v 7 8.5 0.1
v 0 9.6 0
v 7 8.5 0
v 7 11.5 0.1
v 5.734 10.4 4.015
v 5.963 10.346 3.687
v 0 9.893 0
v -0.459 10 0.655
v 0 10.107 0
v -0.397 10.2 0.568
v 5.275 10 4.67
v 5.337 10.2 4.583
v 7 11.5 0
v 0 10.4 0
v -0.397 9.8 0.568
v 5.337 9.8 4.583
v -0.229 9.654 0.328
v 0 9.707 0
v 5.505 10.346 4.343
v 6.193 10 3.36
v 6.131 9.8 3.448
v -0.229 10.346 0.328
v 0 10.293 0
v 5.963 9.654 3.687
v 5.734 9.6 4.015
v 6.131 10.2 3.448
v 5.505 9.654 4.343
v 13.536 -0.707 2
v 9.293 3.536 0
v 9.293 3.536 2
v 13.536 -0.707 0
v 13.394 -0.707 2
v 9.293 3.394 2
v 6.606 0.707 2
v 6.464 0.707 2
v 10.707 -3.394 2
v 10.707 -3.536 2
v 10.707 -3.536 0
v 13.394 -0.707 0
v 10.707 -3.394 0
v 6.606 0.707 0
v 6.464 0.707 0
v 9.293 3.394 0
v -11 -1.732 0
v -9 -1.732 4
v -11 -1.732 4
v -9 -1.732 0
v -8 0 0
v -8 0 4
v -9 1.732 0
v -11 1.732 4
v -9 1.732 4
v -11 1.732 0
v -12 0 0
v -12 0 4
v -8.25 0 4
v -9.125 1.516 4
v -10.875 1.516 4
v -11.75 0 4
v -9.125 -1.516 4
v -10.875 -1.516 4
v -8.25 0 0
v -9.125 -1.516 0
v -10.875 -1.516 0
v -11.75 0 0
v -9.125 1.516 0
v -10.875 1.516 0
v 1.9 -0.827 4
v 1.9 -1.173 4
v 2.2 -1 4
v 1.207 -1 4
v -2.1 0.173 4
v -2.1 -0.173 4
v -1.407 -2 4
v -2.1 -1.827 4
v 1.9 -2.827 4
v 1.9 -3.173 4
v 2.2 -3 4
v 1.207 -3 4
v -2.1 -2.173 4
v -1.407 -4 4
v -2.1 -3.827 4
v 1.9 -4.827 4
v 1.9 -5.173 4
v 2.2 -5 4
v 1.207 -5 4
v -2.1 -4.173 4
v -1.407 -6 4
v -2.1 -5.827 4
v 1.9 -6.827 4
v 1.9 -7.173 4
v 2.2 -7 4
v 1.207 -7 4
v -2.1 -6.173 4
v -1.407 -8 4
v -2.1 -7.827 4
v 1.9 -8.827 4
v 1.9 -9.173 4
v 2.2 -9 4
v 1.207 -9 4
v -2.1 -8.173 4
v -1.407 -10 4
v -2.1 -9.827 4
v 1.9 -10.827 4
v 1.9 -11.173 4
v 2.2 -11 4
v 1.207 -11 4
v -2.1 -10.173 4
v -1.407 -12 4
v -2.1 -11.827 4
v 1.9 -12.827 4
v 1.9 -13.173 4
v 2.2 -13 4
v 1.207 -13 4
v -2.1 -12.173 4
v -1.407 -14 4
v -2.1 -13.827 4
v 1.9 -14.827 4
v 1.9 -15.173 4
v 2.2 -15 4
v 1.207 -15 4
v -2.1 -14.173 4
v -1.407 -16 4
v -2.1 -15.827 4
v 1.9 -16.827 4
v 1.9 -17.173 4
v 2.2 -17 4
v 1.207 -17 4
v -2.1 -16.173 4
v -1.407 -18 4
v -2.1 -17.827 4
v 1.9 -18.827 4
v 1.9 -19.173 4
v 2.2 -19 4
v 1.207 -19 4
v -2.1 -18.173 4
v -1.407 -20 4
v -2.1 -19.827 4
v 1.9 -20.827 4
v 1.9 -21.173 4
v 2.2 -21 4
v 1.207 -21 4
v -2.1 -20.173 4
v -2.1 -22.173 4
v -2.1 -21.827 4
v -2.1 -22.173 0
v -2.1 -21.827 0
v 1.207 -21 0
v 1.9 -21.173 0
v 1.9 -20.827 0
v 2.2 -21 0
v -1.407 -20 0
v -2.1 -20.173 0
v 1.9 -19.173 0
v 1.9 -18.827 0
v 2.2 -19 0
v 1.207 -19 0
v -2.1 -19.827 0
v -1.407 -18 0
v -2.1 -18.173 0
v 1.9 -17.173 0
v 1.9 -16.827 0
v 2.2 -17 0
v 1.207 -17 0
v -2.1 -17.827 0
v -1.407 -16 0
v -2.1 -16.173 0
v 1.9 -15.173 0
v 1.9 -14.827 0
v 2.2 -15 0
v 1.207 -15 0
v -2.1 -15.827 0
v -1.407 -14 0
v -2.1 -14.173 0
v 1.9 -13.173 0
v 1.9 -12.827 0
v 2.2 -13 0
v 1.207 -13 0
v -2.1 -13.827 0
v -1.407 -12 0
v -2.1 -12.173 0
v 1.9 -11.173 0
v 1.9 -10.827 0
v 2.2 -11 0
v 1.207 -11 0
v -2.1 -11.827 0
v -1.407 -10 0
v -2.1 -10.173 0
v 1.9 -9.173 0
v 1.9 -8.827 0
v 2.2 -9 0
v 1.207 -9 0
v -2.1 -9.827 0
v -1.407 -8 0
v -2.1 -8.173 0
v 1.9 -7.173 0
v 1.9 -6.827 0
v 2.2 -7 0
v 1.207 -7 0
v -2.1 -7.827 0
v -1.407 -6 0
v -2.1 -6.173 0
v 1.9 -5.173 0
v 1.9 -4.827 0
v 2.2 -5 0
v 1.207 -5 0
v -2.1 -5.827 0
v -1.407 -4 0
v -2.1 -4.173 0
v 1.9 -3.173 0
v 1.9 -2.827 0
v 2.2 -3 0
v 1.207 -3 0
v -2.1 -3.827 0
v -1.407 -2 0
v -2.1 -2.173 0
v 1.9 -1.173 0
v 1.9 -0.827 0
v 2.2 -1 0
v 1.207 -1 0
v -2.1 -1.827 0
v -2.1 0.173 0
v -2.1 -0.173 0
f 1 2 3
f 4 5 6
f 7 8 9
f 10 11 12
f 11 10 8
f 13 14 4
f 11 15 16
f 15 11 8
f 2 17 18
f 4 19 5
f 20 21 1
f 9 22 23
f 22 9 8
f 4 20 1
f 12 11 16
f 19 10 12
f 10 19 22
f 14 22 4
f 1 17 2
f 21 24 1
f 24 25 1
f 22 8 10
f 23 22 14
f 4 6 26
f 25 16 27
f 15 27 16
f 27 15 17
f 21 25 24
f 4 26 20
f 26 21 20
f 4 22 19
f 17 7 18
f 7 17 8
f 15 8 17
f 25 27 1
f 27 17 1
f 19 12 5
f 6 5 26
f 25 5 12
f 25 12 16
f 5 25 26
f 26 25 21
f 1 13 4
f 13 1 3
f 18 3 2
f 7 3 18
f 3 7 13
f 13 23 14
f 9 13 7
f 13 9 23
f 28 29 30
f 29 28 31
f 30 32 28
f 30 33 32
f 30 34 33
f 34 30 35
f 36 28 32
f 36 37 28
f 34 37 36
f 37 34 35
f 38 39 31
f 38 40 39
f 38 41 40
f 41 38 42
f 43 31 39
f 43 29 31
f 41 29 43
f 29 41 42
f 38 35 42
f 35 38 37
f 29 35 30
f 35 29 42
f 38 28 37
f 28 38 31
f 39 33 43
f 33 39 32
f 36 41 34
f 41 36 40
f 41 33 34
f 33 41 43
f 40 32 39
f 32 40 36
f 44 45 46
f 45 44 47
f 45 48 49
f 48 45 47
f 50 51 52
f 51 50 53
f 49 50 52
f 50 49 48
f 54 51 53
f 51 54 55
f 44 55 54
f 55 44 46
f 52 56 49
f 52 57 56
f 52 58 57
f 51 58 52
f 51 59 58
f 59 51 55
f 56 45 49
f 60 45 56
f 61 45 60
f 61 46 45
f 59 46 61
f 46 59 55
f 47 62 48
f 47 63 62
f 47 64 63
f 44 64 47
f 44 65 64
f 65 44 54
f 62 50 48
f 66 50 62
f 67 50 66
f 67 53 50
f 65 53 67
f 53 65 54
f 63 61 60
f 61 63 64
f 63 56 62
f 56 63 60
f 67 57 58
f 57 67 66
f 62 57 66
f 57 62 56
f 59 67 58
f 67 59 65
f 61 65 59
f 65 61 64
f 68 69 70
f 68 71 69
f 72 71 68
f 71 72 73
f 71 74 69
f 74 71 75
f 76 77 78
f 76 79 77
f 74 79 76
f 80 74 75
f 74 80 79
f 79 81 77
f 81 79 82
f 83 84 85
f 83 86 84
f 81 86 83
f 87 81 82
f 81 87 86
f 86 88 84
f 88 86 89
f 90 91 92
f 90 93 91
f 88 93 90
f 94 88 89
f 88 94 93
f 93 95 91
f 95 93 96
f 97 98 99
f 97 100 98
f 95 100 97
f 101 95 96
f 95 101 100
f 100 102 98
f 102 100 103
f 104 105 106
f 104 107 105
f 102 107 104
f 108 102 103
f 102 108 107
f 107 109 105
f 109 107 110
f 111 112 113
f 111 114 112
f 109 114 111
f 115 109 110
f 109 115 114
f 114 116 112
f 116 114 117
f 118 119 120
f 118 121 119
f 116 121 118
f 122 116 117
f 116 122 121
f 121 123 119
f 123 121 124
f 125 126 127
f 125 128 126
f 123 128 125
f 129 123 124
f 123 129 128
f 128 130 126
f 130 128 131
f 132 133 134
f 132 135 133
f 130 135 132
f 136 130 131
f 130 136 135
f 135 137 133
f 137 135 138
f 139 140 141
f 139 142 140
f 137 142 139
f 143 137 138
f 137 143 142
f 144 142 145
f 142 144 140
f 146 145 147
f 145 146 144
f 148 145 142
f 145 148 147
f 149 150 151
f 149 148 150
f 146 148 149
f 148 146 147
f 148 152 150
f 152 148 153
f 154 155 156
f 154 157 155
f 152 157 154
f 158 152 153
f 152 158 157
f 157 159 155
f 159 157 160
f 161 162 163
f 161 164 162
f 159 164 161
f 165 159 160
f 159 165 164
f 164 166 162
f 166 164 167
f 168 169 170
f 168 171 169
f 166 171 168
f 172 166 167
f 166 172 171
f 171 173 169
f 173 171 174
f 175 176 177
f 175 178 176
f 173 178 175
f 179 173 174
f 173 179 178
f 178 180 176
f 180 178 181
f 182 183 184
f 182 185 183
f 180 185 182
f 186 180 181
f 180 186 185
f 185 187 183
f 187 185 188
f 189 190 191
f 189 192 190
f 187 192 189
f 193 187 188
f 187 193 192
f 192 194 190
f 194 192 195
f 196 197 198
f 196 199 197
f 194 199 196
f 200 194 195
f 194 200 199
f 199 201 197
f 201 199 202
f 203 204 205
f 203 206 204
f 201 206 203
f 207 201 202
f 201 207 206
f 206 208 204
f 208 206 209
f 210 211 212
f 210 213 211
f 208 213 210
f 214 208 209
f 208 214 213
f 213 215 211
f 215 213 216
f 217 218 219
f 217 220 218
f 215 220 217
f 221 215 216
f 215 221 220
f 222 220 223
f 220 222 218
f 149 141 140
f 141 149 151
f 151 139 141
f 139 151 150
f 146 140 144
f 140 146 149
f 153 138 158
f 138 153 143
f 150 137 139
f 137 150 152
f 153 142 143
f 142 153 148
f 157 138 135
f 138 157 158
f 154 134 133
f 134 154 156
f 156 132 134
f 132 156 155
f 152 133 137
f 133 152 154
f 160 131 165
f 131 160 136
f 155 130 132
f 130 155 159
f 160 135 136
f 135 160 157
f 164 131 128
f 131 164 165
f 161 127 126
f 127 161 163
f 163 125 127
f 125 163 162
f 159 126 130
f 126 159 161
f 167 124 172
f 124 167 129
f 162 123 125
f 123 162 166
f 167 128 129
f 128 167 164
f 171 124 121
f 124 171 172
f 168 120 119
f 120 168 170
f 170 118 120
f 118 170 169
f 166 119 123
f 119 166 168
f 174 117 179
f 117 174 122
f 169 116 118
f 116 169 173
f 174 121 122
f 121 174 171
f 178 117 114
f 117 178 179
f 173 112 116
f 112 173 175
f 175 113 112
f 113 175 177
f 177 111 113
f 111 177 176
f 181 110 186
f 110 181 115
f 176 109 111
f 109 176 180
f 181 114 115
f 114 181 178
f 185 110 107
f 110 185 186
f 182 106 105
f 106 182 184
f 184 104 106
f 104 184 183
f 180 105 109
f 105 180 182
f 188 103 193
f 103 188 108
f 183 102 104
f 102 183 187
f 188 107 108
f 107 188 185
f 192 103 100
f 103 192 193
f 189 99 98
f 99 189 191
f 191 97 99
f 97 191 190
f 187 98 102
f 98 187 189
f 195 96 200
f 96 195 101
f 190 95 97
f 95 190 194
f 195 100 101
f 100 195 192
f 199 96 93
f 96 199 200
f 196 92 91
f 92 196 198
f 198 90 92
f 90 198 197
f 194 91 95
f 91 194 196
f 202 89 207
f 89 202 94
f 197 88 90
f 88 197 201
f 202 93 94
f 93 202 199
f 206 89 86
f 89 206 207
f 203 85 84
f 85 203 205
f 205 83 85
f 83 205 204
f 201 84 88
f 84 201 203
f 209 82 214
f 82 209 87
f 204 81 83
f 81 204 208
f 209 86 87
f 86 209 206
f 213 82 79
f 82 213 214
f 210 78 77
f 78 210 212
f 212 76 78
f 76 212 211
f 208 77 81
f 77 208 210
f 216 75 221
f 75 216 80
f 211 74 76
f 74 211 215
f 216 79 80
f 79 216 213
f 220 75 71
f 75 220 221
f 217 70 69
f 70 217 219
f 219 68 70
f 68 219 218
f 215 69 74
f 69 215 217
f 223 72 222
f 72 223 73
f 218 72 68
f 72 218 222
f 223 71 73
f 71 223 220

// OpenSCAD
module earBrace() {
  intersection () {
    hull() {
      rotate([0,55,0]) scale([2,1,1]) cylinder(r=.4,h=7,$fn=12);
      linear_extrude(height=0.1)
        polygon(points=[[0,0],[7,1.5],[7,-1.5]], paths=[[0,1,2,0]]);
    }
    translate([-2,-5,0]) cube([10,10,10]);
  }
}

module supportPillar(x,y,len,rot=0,r=2,xscale=1,yscale=1) {
  translate([x,y,0]) difference() {
                          rotate([0,0,rot]) scale([xscale,yscale,1]) cylinder(r=r    ,h=len  ,$fn=6);
    translate([0,0,-0.5]) rotate([0,0,rot]) scale([xscale,yscale,1]) cylinder(r=r-.25,h=len+1,$fn=6);
  }
}
module supportPillar4(x,y,dx,dy,dz,rot=0) {
t=0.2;
  translate([x,y,dz/2]) rotate([0,0,rot]) difference() {
    cube([dx  ,dy  ,dz  ],center=true);
    cube([dx-t,dy-t,dz+1],center=true);
  }
}

module zigZag(ylen,width,height,step,thick=0.4) {
  union() {
    for(y=[0:step:ylen]) {
      hull() {
        translate([-width/2,y       ,0]) cylinder(h=height,r=thick/2,$fn=3);
        translate([ width/2,y+step/2,0]) cylinder(h=height,r=thick/2,$fn=3);
      }
      hull() {
        translate([ width/2,y+step/2,0]) cylinder(h=height,r=thick/2,$fn=3);
        translate([-width/2,y+step  ,0]) cylinder(h=height,r=thick/2,$fn=3);
      }
    }
  }
}

translate([0,10,0]) earBrace();
supportPillar4(10,0,4,6,2,45);
supportPillar(-10,0,4);
translate([0,-22,0]) zigZag(20,4,4,2);
